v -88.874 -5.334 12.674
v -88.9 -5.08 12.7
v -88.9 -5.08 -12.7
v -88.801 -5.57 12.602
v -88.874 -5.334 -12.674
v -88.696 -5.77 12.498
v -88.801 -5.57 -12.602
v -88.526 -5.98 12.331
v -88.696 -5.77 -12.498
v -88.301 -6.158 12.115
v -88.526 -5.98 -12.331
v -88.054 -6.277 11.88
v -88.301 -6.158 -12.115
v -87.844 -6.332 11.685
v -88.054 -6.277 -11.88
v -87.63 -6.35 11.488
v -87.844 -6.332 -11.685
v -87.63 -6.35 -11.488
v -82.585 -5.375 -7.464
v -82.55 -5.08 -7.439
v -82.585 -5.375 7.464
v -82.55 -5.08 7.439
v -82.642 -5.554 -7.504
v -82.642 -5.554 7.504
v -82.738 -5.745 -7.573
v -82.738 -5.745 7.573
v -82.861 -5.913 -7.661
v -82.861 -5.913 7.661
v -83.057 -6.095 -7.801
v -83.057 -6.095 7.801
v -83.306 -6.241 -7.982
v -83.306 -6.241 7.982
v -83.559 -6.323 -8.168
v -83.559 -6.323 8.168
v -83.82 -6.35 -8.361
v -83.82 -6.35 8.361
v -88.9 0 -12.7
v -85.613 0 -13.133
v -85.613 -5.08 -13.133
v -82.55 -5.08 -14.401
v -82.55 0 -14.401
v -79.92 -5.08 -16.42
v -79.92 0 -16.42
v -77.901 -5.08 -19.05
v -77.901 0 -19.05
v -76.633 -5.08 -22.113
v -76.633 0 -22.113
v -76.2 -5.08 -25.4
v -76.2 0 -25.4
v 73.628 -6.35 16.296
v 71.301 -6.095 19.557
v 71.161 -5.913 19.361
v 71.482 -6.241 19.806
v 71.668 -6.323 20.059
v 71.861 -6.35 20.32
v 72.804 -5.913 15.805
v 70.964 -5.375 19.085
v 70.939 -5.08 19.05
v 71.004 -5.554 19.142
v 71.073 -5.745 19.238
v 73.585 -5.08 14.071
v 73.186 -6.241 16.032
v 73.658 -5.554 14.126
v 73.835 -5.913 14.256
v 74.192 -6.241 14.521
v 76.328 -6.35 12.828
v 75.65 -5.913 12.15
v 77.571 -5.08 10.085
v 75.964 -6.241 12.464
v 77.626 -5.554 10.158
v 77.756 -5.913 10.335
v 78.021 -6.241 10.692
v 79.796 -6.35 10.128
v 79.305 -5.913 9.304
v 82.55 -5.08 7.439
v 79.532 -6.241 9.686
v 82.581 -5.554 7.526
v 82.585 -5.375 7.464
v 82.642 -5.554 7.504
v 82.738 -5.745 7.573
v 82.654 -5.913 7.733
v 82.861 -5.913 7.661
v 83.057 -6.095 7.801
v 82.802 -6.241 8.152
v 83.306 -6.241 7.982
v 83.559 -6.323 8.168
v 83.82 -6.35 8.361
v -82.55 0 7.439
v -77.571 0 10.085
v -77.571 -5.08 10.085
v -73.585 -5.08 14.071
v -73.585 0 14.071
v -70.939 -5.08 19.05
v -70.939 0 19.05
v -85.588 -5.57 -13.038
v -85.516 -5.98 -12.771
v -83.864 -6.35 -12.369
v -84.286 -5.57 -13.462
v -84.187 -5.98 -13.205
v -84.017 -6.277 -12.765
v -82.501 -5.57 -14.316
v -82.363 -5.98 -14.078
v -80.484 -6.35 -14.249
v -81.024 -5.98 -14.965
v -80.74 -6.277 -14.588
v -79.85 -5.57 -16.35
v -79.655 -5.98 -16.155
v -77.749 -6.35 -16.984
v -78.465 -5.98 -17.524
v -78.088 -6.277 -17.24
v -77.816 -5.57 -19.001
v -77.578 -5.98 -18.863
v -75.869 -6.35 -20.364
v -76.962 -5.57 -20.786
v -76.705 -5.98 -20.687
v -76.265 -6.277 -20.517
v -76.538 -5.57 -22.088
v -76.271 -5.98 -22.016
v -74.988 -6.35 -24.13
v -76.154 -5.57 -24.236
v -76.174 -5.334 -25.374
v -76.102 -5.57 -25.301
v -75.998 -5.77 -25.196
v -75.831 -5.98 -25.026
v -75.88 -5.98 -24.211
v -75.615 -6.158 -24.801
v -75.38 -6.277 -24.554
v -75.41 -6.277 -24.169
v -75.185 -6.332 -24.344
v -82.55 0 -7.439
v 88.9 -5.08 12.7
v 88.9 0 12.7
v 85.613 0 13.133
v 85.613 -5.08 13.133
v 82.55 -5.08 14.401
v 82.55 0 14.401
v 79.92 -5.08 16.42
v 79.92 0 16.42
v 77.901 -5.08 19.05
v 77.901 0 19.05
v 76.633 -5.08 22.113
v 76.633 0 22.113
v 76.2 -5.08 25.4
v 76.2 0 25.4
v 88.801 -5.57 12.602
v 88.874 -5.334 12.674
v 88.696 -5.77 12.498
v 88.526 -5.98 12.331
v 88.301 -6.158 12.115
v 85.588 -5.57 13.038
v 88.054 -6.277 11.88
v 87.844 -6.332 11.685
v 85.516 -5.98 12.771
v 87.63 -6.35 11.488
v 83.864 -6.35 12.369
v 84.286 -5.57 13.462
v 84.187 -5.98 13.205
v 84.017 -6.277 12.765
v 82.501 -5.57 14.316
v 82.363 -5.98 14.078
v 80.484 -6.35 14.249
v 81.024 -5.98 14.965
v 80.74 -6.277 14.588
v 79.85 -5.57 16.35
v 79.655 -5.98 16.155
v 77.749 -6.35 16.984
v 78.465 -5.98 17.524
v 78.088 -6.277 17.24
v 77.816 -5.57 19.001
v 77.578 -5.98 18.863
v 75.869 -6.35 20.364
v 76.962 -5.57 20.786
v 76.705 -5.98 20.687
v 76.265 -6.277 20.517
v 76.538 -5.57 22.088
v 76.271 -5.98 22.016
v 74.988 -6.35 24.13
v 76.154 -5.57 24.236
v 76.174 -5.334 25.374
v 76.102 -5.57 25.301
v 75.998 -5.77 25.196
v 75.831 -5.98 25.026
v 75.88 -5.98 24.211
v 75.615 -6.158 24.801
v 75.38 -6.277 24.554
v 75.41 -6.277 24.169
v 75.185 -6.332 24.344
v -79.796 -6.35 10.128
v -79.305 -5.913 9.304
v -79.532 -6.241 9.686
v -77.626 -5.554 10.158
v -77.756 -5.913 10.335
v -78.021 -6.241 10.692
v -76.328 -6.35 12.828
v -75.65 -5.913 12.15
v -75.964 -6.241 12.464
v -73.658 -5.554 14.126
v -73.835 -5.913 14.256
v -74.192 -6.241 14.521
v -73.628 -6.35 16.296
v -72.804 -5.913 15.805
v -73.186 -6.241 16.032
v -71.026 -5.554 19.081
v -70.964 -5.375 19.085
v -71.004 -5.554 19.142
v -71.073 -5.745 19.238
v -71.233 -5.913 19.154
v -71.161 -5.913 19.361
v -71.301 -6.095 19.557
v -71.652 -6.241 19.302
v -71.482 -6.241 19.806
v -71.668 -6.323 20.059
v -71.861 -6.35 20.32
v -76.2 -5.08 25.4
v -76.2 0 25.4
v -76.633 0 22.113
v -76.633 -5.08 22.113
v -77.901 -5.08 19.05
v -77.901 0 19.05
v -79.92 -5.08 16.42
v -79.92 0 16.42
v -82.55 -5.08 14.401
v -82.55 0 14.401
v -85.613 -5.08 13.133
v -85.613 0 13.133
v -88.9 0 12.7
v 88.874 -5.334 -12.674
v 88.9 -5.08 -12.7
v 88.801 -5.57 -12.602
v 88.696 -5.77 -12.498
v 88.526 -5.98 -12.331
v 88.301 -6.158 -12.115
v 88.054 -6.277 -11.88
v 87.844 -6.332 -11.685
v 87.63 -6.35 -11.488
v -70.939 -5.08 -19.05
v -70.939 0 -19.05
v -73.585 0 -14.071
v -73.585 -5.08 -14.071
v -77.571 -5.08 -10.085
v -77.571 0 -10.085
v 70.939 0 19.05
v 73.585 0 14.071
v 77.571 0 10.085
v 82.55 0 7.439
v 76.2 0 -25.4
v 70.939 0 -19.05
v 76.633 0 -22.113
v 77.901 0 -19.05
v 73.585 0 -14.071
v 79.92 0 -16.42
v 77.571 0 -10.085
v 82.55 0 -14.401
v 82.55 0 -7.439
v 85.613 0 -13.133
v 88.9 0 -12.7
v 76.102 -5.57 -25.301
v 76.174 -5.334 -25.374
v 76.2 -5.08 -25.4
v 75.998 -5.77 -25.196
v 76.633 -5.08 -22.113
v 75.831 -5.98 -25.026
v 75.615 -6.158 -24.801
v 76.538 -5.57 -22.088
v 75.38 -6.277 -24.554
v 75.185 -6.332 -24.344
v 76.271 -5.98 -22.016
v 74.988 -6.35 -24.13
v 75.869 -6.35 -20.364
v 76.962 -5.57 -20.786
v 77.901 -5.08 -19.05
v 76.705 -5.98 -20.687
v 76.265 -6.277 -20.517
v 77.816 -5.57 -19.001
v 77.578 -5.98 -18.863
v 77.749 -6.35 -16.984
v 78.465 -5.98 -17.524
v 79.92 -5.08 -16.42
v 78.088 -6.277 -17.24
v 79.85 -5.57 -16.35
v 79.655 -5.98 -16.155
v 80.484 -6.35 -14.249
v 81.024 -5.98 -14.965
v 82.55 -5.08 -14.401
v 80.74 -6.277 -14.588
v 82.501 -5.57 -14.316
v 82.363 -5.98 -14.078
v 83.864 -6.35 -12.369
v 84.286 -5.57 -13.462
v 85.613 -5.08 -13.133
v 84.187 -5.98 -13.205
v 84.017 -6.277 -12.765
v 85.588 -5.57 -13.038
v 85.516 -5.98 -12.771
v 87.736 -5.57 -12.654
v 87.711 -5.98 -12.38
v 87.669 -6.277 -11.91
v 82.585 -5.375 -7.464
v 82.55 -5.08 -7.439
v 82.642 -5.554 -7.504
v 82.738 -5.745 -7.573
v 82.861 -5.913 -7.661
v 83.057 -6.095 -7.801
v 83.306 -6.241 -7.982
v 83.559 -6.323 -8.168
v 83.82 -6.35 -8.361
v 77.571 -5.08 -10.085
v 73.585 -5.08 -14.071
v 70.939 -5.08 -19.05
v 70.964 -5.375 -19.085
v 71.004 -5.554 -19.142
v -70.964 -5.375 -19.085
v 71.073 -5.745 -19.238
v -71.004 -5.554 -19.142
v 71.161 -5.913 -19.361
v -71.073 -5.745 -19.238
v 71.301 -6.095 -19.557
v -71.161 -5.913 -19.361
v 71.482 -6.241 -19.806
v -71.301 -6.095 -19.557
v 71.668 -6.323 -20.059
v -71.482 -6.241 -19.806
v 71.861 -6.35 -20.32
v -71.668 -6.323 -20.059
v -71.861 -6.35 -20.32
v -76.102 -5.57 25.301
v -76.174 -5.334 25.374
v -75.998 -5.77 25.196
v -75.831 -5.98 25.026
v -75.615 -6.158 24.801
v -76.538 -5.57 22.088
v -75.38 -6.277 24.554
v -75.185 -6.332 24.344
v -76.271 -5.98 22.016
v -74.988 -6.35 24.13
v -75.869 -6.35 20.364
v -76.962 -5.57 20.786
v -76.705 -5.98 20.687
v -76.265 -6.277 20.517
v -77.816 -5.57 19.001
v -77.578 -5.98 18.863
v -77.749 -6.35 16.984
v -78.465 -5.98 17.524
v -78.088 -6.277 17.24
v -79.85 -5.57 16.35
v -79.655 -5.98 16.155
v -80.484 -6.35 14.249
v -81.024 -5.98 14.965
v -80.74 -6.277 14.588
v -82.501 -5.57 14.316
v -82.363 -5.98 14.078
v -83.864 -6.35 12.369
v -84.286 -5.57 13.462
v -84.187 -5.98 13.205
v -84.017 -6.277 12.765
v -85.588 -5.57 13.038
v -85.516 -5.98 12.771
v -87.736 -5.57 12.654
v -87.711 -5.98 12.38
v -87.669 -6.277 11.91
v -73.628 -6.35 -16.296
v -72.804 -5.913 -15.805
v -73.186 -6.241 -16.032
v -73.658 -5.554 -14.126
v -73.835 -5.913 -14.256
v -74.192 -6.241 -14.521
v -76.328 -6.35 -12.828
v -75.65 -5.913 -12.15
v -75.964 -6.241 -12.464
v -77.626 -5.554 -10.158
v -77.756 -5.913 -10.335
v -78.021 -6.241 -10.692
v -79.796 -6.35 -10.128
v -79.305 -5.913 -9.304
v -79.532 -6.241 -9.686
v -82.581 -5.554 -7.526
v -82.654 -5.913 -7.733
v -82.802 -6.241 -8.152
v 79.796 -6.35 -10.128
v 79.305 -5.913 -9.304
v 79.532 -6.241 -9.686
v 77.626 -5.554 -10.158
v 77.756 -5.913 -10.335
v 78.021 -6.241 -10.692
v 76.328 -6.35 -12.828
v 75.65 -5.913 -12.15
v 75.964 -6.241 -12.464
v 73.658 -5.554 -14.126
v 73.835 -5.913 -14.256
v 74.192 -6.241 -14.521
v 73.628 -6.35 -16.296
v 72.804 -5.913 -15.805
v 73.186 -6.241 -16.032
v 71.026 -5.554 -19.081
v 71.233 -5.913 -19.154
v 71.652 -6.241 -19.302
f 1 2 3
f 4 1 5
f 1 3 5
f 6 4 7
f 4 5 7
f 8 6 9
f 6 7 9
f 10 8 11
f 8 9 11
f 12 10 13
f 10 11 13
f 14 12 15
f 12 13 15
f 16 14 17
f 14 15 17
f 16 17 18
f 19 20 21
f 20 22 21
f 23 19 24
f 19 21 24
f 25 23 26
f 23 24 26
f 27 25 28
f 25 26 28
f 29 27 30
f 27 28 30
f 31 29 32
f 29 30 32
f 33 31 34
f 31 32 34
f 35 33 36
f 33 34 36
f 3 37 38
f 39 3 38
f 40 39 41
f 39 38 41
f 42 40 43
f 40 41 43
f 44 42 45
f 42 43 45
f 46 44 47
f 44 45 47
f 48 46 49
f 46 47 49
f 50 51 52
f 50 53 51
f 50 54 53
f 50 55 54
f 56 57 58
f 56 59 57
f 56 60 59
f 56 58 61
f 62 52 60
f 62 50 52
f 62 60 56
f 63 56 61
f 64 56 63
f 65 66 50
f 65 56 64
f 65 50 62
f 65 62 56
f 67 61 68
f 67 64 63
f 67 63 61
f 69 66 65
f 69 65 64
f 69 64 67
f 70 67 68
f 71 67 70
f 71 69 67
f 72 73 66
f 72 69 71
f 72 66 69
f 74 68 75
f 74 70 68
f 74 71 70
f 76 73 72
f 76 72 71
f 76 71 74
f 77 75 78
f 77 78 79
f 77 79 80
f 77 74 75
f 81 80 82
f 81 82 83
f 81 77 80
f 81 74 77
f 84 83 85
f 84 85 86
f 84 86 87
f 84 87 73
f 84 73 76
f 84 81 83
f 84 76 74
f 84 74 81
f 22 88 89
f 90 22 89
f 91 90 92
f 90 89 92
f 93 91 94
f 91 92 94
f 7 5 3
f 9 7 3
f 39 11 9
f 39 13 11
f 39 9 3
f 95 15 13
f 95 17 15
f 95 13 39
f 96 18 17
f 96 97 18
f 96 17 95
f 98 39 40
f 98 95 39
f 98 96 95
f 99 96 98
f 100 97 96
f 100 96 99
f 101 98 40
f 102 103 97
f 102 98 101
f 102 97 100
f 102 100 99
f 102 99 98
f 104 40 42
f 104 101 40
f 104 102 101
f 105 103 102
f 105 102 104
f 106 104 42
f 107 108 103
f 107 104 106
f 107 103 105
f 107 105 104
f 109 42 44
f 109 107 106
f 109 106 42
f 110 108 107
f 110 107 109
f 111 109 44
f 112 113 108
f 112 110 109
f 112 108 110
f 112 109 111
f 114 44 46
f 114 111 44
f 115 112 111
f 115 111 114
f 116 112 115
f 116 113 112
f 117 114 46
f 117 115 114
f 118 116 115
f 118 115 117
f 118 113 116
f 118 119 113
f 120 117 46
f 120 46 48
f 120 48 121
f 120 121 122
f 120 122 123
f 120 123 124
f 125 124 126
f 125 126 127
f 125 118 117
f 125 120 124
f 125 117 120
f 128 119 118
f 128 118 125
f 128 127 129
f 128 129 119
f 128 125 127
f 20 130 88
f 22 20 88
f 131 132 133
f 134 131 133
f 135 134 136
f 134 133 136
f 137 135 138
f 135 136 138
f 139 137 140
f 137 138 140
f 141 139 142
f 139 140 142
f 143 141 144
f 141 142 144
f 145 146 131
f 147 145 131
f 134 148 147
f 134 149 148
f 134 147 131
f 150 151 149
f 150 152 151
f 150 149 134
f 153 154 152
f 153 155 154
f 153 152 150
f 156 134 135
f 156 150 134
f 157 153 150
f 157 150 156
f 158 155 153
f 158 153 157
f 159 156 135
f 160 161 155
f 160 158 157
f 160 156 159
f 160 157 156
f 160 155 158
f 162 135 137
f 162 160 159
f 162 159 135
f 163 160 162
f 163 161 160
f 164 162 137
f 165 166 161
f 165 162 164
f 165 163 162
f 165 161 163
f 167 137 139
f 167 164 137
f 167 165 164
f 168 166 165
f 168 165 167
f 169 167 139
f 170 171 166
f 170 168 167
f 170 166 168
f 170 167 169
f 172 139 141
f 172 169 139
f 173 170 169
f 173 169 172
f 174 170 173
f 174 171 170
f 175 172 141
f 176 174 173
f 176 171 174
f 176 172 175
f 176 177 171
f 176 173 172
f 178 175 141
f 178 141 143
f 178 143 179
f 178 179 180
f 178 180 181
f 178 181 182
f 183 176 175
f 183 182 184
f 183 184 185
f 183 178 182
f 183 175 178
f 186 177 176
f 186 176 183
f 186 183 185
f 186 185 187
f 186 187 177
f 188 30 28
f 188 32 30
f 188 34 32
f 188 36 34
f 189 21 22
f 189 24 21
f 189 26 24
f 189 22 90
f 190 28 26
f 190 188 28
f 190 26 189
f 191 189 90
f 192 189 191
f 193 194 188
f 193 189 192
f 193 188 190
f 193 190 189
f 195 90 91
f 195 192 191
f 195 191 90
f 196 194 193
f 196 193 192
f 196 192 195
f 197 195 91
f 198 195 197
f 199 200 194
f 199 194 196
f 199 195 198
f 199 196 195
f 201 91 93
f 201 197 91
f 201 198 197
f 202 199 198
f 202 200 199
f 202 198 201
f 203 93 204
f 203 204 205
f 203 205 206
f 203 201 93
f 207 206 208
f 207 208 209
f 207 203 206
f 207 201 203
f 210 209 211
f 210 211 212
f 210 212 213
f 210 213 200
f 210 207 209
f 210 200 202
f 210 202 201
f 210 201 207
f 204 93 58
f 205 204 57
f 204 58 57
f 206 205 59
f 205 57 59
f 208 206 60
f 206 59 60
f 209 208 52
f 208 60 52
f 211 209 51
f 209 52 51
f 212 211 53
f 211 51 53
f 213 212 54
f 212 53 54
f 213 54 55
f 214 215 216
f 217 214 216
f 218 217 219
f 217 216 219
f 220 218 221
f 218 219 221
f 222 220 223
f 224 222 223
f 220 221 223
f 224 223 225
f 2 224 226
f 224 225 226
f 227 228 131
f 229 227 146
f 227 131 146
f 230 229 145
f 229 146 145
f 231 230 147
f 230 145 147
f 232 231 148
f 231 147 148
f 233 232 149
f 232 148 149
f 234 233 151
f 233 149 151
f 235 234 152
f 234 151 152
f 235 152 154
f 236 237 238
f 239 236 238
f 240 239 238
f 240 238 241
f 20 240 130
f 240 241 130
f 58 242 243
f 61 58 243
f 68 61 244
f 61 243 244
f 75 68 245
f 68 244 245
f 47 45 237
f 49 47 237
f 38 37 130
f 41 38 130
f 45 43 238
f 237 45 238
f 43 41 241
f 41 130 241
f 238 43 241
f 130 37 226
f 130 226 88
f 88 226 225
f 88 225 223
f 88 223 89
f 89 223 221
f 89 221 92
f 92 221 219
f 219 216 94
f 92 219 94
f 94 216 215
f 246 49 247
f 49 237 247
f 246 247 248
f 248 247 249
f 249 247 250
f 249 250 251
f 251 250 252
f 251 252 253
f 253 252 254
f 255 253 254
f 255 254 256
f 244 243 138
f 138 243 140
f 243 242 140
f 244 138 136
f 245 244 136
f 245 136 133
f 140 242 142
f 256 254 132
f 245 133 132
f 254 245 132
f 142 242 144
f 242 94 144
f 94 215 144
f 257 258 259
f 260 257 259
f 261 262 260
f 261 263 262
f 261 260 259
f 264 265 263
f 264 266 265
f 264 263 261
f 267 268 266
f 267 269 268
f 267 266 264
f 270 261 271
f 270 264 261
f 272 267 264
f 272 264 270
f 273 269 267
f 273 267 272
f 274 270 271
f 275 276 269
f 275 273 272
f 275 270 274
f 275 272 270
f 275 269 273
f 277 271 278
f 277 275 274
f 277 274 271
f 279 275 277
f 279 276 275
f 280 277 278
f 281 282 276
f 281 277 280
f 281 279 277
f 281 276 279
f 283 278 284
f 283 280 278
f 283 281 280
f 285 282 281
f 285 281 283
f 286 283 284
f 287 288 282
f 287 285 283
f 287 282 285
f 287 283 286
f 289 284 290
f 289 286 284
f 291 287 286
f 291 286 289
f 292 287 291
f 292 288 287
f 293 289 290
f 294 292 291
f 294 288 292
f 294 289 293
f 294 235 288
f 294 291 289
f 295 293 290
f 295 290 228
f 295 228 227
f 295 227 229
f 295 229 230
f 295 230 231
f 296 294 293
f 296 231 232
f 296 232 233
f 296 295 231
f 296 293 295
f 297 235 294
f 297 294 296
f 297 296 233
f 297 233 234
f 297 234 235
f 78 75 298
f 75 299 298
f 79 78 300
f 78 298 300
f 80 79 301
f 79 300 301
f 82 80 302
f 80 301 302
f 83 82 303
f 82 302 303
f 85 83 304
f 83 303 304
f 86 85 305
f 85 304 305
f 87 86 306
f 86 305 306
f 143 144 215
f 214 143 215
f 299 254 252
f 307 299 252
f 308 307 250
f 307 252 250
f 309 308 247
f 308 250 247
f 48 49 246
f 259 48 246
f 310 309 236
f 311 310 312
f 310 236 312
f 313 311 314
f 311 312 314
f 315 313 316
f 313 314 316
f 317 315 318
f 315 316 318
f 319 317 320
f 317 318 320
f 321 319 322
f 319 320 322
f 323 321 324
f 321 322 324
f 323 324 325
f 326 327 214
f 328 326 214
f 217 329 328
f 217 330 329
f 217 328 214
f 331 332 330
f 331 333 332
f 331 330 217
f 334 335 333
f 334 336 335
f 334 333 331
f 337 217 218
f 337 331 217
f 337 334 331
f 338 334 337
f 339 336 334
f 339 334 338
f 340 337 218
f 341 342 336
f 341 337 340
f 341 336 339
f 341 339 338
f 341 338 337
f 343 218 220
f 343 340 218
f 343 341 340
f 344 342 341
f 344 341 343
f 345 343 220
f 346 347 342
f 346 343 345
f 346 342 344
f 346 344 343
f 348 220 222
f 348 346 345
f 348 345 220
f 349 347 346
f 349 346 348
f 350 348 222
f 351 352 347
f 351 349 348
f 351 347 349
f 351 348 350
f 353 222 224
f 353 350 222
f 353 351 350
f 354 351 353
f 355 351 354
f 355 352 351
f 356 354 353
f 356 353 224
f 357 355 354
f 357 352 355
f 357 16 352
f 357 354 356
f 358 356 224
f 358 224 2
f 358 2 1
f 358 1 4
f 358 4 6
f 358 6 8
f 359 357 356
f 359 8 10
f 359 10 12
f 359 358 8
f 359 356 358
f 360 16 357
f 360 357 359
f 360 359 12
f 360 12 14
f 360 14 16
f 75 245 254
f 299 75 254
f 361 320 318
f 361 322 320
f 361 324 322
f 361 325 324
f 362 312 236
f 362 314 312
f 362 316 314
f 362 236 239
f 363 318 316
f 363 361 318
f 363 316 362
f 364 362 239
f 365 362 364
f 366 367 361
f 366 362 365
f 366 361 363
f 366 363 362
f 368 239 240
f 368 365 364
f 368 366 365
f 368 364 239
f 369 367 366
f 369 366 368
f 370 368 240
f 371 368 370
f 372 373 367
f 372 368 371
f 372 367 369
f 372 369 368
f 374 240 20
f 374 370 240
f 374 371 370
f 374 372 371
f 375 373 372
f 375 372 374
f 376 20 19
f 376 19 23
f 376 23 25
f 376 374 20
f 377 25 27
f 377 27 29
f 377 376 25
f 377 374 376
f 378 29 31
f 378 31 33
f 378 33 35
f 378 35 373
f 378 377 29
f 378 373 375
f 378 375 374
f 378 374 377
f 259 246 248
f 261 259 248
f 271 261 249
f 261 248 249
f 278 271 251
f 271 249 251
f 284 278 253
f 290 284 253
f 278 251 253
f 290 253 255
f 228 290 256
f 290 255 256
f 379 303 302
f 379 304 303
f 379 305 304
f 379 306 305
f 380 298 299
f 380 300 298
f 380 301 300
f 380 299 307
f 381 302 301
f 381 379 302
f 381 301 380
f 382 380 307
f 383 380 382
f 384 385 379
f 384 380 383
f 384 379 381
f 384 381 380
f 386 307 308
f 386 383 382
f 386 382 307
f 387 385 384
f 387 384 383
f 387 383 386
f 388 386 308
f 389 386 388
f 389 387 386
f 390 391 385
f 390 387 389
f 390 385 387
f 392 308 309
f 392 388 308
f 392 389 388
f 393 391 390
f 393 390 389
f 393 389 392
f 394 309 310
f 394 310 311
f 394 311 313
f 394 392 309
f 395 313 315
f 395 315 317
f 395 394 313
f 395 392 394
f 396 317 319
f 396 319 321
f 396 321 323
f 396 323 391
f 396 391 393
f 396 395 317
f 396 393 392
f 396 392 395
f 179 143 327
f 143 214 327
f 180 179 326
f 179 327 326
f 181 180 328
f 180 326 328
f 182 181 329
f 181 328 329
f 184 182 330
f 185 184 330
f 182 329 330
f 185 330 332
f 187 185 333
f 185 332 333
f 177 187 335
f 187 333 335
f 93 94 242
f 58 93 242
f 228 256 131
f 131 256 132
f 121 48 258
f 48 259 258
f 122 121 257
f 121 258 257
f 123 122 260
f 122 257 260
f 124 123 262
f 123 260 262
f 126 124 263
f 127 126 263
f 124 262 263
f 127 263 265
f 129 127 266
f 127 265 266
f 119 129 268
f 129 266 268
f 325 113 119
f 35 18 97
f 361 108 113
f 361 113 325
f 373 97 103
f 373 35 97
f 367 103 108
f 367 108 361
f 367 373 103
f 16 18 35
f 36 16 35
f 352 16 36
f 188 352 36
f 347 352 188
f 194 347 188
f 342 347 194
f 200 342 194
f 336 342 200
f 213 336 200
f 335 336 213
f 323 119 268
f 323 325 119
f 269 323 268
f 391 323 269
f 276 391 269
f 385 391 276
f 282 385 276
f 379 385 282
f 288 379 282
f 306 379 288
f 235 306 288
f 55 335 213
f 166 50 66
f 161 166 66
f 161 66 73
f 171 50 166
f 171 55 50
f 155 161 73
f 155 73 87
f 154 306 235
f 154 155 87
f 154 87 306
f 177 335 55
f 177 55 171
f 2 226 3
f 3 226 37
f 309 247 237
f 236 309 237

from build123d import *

# Parameters (mm, degrees)
F1_DEPTH = 6.35
F2_R     = 1.27


with BuildPart() as f1:
    # F0 (on Front) → F1 (new body)
    with BuildSketch(Plane.XZ):
        with BuildLine():
            ThreePointArc((-69.85, 25.4), (-70.1243474386, 22.1786073053), (-70.9394877579, 19.05))
            Line((-70.9394877579, 19.05), (70.9394877579, 19.05))
            ThreePointArc((70.9394877579, 19.05), (70.1243474386, 22.1786073053), (69.85, 25.4))
            Line((69.85, 25.4), (-69.85, 25.4))
        make_face()
        with BuildLine():
            Line((-88.9, 12.7), (-88.9, 6.35))
            ThreePointArc((-88.9, 6.35), (-85.6786055668, 6.6243477369), (-82.5499966741, 7.4394889338))
            ThreePointArc((-82.5499966741, 7.4394889338), (-75.4296145712, 11.9296170656), (-70.9394877579, 19.05))
            ThreePointArc((-70.9394877579, 19.05), (-70.1243474386, 22.1786073053), (-69.85, 25.4))
            Line((-69.85, 25.4), (-76.2, 25.4))
            ThreePointArc((-76.2, 25.4), (-79.9197438789, 16.4197438789), (-88.9, 12.7))
        make_face()
        with BuildLine():
            ThreePointArc((-88.9, -12.7), (-79.9197438789, -16.4197438789), (-76.2, -25.4))
            Line((-76.2, -25.4), (-69.85, -25.4))
            ThreePointArc((-69.85, -25.4), (-70.1243475845, -22.1786064547), (-70.9394883332, -19.0499983728))
            ThreePointArc((-70.9394883332, -19.0499983728), (-75.4296151814, -11.9296164554), (-82.5499966741, -7.4394889338))
            ThreePointArc((-82.5499966741, -7.4394889338), (-85.6786055668, -6.6243477369), (-88.9, -6.35))
            Line((-88.9, -6.35), (-88.9, -12.7))
        make_face()
        with BuildLine():
            Line((-88.9, 6.35), (-88.9, -6.35))
            ThreePointArc((-88.9, -6.35), (-85.6786055668, -6.6243477369), (-82.5499966741, -7.4394889338))
            Line((-82.5499966741, -7.4394889338), (-82.5499966741, 7.4394889338))
            ThreePointArc((-82.5499966741, 7.4394889338), (-85.6786055668, 6.6243477369), (-88.9, 6.35))
        make_face()
        with BuildLine():
            ThreePointArc((-70.9394883332, -19.0499983728), (-70.1243475845, -22.1786064547), (-69.85, -25.4))
            Line((-69.85, -25.4), (69.85, -25.4))
            ThreePointArc((69.85, -25.4), (70.1243475845, -22.1786064547), (70.9394883332, -19.0499983728))
            Line((70.9394883332, -19.0499983728), (-70.9394883332, -19.0499983728))
        make_face()
        with BuildLine():
            ThreePointArc((70.9394883332, -19.0499983728), (70.1243475845, -22.1786064547), (69.85, -25.4))
            Line((69.85, -25.4), (76.2, -25.4))
            ThreePointArc((76.2, -25.4), (79.9197438789, -16.4197438789), (88.9, -12.7))
            Line((88.9, -12.7), (88.9, -6.35))
            ThreePointArc((88.9, -6.35), (85.6786073053, -6.6243474386), (82.55, -7.4394877579))
            ThreePointArc((82.55, -7.4394877579), (75.4296164286, -11.9296152082), (70.9394883332, -19.0499983728))
        make_face()
        with BuildLine():
            Line((82.55, 7.4394877579), (82.55, -7.4394877579))
            ThreePointArc((82.55, -7.4394877579), (85.6786073053, -6.6243474386), (88.9, -6.35))
            Line((88.9, -6.35), (88.9, 6.35))
            ThreePointArc((88.9, 6.35), (85.6786073053, 6.6243474386), (82.55, 7.4394877579))
        make_face()
        with BuildLine():
            ThreePointArc((70.9394877579, 19.05), (75.4296158184, 11.9296158184), (82.55, 7.4394877579))
            ThreePointArc((82.55, 7.4394877579), (85.6786073053, 6.6243474386), (88.9, 6.35))
            Line((88.9, 6.35), (88.9, 12.7))
            ThreePointArc((88.9, 12.7), (79.9197438789, 16.4197438789), (76.2, 25.4))
            Line((76.2, 25.4), (69.85, 25.4))
            ThreePointArc((69.85, 25.4), (70.1243474386, 22.1786073053), (70.9394877579, 19.05))
        make_face()
    extrude(amount=F1_DEPTH)

    # F2
    f2_edges = [f1.edges().sort_by_distance(p)[0] for p in [
        (-79.919744, -6.35, 16.419744),
        (-88.9, -6.35, 0),
        (-79.919744, -6.35, -16.419744),
        (0, -6.35, -25.4),
        (0, -6.35, 25.4),
        (79.919744, -6.35, 16.419744),
        (88.9, -6.35, 0),
        (79.919744, -6.35, -16.419744),
        (82.55, -6.35, 0),
        (75.429616, -6.35, 11.929616),
        (0, -6.35, 19.05),
        (-75.429615, -6.35, 11.929617),
        (-82.549997, -6.35, 0),
        (-75.429615, -6.35, -11.929616),
        (0, -6.35, -19.049998),
        (75.429616, -6.35, -11.929615),
    ]]
    fillet(f2_edges, radius=F2_R)


solid = f1.part
